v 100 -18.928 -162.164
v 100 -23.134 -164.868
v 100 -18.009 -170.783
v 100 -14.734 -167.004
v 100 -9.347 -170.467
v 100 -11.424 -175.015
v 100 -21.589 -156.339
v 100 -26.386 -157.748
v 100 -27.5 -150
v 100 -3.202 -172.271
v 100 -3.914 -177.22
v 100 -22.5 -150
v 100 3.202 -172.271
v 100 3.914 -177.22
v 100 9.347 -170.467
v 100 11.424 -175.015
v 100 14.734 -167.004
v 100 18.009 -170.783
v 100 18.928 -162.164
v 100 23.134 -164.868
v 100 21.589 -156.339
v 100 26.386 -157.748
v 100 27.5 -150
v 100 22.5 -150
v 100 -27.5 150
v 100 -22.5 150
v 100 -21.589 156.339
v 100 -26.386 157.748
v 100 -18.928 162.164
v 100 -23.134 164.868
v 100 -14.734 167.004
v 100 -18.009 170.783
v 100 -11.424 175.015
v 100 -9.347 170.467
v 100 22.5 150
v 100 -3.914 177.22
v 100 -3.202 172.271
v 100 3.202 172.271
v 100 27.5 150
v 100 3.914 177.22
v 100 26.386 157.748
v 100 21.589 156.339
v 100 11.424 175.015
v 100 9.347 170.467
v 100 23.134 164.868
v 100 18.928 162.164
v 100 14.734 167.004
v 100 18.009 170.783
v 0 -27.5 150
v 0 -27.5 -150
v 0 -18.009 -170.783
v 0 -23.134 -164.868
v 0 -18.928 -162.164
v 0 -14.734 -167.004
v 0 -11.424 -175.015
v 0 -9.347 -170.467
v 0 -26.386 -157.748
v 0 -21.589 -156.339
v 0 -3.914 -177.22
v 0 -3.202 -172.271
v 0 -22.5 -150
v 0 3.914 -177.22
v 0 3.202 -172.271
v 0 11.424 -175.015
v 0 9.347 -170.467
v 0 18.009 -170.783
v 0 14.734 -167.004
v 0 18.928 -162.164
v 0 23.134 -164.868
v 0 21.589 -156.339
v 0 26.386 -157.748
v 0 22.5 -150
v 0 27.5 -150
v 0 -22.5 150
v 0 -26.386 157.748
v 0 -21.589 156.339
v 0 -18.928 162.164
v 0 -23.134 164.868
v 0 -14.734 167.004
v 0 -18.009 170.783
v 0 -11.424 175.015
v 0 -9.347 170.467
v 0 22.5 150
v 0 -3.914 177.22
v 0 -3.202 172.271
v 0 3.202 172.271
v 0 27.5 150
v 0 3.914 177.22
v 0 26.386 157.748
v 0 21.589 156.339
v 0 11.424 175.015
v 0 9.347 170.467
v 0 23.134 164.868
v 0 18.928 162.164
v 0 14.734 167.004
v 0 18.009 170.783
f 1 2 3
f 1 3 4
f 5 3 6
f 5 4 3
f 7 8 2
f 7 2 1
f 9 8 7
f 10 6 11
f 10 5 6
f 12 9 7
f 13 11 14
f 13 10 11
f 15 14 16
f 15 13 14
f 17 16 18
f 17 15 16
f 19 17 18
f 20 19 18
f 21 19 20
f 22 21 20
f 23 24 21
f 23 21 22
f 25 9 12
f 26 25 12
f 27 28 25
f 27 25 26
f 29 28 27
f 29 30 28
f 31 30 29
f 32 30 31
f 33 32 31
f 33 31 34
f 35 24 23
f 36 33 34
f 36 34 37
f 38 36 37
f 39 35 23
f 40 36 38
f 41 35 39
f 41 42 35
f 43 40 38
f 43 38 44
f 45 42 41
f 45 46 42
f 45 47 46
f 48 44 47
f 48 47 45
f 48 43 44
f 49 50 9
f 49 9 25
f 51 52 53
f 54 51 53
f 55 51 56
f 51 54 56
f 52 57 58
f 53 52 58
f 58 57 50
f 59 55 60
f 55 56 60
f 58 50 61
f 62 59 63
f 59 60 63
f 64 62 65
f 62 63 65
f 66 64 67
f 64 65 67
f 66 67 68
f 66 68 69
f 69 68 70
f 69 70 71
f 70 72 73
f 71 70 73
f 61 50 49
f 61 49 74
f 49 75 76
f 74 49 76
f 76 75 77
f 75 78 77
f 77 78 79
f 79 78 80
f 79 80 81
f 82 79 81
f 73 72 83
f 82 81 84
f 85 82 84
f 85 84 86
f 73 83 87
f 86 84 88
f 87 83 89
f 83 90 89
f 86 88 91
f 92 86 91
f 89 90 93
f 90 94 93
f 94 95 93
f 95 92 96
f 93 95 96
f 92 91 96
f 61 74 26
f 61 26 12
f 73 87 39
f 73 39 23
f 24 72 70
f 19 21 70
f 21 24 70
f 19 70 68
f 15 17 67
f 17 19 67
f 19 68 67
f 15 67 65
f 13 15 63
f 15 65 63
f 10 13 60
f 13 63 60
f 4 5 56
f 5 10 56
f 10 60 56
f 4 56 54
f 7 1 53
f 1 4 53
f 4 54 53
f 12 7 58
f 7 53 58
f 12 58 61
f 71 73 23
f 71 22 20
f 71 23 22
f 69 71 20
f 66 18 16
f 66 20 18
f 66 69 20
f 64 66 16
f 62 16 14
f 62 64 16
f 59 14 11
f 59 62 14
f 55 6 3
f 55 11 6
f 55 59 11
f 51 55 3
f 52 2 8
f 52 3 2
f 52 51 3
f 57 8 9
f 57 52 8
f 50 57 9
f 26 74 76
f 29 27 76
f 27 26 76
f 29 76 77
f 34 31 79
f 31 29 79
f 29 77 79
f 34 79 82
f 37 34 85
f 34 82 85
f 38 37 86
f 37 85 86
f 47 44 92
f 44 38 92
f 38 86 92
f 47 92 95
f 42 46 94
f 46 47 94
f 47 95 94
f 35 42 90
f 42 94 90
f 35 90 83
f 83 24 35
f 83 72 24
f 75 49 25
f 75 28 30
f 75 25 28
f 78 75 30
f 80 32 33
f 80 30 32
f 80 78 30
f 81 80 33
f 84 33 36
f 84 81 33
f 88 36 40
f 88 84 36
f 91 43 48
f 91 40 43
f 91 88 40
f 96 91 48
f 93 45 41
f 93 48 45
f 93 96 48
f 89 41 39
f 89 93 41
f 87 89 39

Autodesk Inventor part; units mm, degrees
ref_plane "YZ Plane" through (0, 0, 0) normal (1, 0, 0) x (0, 1, 0)
ref_plane "XZ Plane" through (0, 0, 0) normal (0, 1, 0) x (-1, 0, 0)
ref_plane "XY Plane" through (0, 0, 0) normal (0, 0, 1) x (1, 0, 0)
sketch "Sketch1" plane through (0, 0, 0) normal (1, 0, 0) x (0, 1, 0)
  line L0 (0, 150) -> (0, -150) construction
  line L1 (-22.5, 150) -> (-22.5, -150)
  line L2 (22.5, -150) -> (22.5, 150)
  arc A0 (22.5, 150) -> (-22.5, 150) centre (0, 150) ccw
  arc A1 (-22.5, -150) -> (22.5, -150) centre (0, -150) ccw
  line L3 (27.5, 150) -> (27.5, -150)
  arc A2 (-27.5, -150) -> (27.5, -150) centre (0, -150) ccw
  line L4 (-27.5, -150) -> (-27.5, 150)
  arc A3 (27.5, 150) -> (-27.5, 150) centre (0, 150) ccw
  point P0 (0, 0)
  dimension "d0" = 150
  dimension "d1" = 45
  dimension "d2" = 5
extrude "Extrusion1" add sketch "Sketch1" along normal blind 100
properties part number "Conveyor Belt New" material "Rubber, Silicone"
